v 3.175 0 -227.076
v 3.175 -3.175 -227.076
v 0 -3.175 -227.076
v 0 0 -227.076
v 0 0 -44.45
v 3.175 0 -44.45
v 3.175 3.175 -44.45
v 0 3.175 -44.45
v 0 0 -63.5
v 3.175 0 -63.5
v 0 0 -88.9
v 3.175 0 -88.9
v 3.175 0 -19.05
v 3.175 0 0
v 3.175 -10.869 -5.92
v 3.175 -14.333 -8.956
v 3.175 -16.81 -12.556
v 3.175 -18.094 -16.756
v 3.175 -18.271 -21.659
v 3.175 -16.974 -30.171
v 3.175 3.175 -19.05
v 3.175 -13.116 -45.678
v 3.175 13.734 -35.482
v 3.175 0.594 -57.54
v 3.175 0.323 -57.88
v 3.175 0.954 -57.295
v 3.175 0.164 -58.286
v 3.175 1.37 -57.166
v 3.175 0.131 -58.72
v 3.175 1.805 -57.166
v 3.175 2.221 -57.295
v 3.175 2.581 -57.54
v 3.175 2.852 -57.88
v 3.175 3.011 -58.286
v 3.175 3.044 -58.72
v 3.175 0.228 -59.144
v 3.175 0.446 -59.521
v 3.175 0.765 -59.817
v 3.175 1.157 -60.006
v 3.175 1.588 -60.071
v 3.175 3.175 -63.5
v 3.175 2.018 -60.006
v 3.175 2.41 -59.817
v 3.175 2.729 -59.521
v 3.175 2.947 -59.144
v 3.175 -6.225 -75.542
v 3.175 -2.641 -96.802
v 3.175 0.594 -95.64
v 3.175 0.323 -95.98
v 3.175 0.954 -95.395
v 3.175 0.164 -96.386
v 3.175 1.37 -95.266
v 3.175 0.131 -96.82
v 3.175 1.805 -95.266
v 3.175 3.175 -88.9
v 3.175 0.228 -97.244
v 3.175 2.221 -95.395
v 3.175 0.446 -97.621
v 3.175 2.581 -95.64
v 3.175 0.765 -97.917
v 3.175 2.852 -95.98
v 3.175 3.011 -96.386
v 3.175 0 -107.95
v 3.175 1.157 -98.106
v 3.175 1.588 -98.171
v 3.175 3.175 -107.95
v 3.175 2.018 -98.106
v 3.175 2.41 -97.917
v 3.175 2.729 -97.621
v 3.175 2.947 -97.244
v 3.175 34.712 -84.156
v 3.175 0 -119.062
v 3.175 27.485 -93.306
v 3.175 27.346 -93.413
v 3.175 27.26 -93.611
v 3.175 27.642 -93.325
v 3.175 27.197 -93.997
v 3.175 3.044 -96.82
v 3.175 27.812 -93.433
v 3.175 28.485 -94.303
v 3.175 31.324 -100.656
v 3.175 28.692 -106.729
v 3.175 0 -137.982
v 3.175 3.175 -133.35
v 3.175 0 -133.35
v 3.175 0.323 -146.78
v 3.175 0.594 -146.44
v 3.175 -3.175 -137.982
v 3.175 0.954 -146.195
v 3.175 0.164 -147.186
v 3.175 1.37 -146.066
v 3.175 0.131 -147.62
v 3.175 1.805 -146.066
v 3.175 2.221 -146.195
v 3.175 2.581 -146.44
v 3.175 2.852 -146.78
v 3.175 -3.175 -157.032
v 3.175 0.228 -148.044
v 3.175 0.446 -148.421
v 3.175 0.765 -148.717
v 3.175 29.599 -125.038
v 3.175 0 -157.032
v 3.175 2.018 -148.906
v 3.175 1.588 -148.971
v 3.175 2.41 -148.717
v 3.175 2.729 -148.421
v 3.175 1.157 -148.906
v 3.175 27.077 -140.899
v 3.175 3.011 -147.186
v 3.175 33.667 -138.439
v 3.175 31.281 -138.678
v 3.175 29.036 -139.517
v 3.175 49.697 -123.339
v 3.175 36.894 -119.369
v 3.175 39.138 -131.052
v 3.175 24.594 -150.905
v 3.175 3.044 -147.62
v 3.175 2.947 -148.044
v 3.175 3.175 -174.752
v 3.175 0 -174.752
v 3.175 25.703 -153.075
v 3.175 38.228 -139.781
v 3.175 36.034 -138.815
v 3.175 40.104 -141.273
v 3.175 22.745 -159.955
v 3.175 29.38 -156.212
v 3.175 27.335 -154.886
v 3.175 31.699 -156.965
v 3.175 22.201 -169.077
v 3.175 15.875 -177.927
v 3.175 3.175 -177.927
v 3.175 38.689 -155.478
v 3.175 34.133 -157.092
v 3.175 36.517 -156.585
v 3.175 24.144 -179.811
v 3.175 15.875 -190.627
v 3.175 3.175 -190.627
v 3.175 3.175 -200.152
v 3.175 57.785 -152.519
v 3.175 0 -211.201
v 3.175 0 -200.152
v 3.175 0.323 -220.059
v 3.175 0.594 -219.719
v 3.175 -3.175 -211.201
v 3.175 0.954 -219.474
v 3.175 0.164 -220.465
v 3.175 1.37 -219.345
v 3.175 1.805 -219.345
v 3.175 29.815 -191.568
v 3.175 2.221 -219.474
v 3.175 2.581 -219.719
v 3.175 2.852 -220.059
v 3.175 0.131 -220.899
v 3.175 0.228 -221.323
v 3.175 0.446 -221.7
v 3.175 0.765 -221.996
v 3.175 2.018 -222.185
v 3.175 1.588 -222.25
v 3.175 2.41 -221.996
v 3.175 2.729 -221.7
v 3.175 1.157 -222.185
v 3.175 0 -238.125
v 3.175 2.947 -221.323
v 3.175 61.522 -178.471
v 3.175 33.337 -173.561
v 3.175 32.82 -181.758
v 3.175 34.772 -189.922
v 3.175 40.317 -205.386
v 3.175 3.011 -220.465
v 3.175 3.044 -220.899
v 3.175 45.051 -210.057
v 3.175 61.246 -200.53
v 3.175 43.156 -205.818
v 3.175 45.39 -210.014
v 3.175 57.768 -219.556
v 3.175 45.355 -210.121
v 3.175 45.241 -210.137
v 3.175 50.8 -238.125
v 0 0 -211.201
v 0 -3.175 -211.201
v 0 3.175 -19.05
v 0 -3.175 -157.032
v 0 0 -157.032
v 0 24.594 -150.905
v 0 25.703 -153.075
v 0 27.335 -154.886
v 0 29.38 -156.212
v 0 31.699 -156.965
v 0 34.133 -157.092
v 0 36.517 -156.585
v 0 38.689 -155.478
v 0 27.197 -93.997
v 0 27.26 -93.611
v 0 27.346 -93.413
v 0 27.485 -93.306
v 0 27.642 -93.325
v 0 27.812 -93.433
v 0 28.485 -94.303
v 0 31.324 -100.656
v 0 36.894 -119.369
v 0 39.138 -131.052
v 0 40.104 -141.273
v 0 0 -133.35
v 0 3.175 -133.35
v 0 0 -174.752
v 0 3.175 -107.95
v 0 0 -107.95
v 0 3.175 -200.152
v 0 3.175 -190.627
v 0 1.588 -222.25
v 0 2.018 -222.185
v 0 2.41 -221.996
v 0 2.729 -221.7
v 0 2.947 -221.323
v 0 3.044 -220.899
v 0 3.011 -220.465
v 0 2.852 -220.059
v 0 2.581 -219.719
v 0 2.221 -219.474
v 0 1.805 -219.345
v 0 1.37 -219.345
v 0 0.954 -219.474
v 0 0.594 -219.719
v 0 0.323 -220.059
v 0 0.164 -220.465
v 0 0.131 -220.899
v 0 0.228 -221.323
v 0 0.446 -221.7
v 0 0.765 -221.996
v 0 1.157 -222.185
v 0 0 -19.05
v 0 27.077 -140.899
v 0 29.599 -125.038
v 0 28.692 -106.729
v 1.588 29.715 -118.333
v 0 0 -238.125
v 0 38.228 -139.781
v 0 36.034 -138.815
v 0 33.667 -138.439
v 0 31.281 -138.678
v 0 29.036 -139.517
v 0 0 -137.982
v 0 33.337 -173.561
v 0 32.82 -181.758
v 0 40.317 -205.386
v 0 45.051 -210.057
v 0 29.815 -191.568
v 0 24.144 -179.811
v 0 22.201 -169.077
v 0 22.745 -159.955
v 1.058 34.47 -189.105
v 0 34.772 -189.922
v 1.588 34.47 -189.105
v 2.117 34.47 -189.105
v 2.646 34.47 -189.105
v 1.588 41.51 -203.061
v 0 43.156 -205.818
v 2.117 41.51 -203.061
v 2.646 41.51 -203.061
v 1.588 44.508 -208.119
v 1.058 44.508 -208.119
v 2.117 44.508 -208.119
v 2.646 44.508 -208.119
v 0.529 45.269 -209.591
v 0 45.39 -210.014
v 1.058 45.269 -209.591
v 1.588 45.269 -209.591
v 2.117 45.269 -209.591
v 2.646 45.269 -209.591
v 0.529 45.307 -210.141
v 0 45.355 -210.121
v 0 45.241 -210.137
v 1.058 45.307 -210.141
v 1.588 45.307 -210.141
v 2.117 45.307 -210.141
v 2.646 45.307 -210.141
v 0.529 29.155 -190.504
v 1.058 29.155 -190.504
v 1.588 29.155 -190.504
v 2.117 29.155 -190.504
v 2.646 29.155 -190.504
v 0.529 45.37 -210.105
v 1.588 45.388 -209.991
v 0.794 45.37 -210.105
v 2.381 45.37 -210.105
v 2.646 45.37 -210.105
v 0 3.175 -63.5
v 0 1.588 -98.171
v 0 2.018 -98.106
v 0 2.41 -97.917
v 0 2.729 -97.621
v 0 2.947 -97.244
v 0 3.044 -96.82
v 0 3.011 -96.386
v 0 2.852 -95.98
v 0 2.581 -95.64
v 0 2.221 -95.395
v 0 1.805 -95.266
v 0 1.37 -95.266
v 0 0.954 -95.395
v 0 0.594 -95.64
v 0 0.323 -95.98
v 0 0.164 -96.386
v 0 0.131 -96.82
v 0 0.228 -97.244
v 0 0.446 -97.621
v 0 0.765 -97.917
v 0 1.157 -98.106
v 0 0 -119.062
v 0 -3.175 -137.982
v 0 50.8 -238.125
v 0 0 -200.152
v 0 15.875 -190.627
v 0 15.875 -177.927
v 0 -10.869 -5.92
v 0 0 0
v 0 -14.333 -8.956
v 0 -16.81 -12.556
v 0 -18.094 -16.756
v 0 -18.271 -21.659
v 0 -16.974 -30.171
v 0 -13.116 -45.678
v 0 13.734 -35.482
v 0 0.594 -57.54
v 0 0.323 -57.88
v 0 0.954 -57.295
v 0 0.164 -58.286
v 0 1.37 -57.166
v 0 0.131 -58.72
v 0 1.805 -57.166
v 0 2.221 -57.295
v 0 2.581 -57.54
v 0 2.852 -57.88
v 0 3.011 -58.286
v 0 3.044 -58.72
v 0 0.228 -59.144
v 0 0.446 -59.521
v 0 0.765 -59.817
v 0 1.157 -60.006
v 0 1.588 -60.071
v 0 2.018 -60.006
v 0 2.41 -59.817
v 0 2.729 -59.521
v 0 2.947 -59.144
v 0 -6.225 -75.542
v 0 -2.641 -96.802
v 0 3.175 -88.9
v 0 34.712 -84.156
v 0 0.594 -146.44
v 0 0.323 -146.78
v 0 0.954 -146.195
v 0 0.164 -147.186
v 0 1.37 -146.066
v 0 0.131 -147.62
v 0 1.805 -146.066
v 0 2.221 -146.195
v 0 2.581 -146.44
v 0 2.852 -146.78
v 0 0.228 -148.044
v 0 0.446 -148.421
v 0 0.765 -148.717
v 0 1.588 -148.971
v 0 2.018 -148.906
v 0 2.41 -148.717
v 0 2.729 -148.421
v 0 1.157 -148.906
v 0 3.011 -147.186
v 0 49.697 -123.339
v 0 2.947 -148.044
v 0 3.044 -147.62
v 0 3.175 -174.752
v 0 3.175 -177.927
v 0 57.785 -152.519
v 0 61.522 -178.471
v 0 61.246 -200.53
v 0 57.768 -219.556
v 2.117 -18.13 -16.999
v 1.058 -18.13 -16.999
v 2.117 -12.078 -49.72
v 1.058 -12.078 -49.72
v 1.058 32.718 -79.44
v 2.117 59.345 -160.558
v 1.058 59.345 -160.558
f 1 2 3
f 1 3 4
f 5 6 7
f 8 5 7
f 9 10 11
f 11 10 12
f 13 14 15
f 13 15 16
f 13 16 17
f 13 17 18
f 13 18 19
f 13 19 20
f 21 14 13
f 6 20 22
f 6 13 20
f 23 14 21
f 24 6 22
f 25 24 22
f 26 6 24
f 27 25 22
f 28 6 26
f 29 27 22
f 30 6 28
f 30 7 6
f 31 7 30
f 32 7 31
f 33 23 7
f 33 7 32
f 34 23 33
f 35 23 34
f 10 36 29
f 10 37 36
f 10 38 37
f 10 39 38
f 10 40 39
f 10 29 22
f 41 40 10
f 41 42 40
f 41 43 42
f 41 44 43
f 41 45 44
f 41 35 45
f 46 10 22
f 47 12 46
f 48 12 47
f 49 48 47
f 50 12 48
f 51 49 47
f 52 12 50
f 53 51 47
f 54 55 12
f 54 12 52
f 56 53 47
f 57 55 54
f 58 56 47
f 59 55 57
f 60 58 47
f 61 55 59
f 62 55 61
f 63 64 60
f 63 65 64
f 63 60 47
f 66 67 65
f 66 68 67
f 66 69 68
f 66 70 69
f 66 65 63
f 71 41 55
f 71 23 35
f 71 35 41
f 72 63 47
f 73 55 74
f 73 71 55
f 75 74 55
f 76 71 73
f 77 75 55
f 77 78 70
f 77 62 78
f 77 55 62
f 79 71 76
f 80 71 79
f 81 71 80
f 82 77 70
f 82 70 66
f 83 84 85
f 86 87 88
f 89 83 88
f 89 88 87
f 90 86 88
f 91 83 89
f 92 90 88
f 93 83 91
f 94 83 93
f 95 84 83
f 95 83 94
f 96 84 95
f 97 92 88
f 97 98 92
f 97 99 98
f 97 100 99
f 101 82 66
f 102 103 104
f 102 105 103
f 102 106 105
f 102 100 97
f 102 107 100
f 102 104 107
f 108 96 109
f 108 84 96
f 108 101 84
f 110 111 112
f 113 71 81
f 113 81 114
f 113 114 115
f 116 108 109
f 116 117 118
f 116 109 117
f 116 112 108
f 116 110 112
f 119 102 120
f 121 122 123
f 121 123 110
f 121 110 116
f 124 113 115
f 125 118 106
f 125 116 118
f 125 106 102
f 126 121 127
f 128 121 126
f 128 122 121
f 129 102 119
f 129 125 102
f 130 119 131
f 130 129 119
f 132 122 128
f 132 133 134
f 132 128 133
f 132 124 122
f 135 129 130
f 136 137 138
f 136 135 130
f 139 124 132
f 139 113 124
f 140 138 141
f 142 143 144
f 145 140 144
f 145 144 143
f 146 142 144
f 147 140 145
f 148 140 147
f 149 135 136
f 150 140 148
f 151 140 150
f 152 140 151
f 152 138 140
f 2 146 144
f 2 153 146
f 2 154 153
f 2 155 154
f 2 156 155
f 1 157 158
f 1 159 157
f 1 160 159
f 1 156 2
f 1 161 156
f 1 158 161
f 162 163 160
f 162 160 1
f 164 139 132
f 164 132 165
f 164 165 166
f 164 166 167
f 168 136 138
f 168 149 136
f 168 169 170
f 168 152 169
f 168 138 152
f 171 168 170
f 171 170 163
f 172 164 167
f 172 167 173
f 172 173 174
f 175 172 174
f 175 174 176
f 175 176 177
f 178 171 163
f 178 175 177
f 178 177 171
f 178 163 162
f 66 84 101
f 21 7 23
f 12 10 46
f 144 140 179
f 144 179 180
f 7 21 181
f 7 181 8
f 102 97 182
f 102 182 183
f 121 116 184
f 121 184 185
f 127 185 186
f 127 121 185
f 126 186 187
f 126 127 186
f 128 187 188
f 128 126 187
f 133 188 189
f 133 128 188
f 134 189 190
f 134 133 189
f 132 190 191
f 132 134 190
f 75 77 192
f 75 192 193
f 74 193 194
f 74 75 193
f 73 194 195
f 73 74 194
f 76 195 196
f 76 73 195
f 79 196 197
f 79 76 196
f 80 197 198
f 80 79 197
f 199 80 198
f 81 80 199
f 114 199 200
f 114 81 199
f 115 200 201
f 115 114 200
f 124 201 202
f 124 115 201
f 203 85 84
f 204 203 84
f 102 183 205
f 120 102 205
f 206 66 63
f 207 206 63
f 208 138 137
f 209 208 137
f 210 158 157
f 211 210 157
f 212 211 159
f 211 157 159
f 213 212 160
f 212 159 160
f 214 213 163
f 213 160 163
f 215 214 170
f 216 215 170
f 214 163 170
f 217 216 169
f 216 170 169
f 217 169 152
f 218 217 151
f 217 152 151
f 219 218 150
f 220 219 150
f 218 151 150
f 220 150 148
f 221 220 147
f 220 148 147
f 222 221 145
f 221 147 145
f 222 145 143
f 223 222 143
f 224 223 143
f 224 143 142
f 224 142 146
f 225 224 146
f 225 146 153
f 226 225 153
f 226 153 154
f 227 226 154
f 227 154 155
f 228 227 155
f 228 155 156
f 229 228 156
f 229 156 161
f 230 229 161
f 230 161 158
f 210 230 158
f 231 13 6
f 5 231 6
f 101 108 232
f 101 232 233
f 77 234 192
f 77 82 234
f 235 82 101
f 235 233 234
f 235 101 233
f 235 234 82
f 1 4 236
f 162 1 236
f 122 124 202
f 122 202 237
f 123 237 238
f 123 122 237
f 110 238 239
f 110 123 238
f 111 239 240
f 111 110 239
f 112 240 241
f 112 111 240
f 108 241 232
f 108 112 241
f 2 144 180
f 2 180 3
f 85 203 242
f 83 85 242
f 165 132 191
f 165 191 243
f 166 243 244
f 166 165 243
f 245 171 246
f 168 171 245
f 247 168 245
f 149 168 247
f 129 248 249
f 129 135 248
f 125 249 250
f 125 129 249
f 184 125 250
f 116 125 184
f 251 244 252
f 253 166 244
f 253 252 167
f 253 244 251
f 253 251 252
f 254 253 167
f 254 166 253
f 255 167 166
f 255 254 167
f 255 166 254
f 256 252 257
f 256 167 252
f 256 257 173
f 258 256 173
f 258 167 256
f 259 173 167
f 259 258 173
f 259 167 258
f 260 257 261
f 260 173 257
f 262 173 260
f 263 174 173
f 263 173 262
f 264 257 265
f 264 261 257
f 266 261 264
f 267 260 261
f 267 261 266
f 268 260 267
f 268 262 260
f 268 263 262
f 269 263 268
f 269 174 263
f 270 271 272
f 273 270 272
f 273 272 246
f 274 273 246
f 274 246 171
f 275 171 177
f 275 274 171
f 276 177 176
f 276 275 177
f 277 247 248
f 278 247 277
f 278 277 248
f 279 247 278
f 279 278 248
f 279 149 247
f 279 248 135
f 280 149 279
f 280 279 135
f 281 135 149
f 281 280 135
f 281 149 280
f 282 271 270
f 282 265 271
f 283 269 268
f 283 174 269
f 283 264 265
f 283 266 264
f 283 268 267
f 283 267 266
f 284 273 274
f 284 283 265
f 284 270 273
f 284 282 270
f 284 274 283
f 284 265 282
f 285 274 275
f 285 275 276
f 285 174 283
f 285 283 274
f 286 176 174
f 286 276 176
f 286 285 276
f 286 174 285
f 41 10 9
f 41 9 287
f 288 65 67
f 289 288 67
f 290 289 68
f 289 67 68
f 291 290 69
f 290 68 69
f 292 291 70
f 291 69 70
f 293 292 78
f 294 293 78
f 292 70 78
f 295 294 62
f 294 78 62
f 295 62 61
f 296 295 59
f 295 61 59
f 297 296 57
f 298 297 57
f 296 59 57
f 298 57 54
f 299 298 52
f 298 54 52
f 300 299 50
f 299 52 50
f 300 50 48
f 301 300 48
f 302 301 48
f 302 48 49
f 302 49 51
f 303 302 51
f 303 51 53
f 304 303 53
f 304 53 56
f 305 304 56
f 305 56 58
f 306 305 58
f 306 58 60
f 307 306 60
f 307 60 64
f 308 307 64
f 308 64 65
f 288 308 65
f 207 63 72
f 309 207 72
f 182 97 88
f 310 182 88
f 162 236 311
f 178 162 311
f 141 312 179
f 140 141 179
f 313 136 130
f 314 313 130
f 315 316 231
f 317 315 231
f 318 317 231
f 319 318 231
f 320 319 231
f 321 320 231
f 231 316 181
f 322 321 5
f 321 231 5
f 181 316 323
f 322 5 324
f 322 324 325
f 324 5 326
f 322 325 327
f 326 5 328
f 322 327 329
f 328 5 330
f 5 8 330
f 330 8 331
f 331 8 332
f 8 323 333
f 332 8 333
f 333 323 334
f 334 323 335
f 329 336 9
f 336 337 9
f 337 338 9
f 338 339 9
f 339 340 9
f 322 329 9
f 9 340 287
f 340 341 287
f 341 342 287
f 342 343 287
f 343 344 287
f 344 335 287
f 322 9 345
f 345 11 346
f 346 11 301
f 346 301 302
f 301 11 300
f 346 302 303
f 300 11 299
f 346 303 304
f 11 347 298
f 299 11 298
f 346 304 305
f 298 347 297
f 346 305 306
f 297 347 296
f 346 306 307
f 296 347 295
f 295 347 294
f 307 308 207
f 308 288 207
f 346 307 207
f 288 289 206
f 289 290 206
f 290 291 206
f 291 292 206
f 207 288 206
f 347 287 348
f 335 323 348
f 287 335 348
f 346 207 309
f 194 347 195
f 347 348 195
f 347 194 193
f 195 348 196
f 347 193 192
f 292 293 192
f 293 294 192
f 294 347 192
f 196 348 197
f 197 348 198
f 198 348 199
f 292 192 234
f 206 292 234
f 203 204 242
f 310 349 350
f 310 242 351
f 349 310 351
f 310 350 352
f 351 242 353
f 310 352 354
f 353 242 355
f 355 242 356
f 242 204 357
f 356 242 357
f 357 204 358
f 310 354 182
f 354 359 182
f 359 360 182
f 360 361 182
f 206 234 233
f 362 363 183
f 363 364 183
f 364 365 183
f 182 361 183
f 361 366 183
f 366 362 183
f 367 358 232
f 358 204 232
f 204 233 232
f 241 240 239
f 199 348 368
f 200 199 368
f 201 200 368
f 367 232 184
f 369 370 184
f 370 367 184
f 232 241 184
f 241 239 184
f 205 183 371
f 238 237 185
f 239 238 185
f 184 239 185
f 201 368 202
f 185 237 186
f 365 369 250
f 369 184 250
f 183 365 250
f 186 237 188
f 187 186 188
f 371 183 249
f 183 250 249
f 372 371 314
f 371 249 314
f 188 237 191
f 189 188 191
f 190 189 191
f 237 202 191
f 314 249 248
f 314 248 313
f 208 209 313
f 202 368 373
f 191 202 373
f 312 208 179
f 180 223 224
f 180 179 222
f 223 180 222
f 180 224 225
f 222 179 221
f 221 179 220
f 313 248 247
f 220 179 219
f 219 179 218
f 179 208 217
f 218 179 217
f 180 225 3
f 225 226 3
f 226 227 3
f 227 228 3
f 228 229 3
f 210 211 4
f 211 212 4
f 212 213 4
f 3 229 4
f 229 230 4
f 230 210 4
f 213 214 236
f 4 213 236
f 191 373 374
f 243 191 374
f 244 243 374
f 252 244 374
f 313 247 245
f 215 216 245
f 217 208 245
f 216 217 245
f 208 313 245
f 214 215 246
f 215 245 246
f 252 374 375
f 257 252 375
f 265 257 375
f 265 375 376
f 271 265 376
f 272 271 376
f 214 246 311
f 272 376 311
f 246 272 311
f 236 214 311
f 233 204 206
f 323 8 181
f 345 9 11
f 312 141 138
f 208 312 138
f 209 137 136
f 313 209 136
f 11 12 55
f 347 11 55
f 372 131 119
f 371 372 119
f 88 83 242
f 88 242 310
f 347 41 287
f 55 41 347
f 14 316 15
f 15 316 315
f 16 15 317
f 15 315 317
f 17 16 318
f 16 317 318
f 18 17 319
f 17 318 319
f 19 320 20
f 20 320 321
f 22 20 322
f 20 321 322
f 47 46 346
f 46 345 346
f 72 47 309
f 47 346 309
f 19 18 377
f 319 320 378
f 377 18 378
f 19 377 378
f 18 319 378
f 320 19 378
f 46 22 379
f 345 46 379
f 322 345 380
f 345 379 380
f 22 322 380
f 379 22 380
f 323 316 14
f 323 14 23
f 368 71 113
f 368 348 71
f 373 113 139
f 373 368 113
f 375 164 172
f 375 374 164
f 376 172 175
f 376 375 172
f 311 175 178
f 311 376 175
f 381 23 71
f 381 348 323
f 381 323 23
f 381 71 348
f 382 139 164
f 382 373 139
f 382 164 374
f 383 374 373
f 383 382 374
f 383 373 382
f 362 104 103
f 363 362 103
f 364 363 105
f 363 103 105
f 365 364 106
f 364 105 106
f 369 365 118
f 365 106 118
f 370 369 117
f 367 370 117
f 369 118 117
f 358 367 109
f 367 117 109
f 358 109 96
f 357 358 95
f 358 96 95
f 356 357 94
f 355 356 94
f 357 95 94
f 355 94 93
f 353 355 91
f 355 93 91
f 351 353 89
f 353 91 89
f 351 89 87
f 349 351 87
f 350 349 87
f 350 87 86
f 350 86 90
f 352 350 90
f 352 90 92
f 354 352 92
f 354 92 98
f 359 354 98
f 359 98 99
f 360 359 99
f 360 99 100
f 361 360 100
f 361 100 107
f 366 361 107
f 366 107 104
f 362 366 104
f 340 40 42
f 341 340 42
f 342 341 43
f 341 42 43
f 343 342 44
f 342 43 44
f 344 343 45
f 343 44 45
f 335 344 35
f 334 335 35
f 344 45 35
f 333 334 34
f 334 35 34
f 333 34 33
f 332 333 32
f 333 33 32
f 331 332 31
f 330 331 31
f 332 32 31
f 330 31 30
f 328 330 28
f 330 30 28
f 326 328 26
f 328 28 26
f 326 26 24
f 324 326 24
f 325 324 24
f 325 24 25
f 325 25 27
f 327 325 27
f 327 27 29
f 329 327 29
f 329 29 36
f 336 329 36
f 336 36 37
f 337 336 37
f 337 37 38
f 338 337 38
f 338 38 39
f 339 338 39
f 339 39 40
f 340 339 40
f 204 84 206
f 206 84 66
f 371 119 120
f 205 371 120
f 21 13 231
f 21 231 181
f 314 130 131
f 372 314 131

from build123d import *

# Parameters (mm, degrees)
BOSS_EXTRUDE1_DEPTH = 3.175
SKETCH2_R           = 1.4605
SKETCH2_W           = 25.4
SKETCH2_H           = 3.175
CUT_EXTRUDE1_DEPTH  = 6.35
BOSS_EXTRUDE3_DEPTH = 3.175
CUT_EXTRUDE2_DEPTH  = 3.175
SKETCH5_R           = 9.342587617
BOSS_EXTRUDE4_DEPTH = 3.175


with BuildPart() as part:
    # Sketch1 → Boss-Extrude1 (new body)
    with BuildSketch(Plane(origin=(0, 0, 0), x_dir=(0, 0, -1), z_dir=(1, 0, 0))):
        with BuildLine():
            Line((119.0625, 0), (238.125, 0))
            Line((238.125, 0), (238.125, 50.8))
            add(Edge.make_bspline(
                [(0, 0), (76.859833449, 26.070949446), (164.07477212, 86.623684005), (238.125, 50.8)],
                knots=[0, 0, 0, 0, 1, 1, 1, 1], degree=3))
            add(Edge.make_bspline(
                [(0, 0), (16.104921012, -36.272981342), (24.443498776, -9.039116005), (119.0625, 0)],
                knots=[0, 0, 0, 0, 1, 1, 1, 1], degree=3))
        make_face()
    extrude(amount=BOSS_EXTRUDE1_DEPTH)

    # Sketch2 → Cut-Extrude1 (cut)
    with BuildSketch(Plane(origin=(3.175, 0, 0), x_dir=(0, 0, -1), z_dir=(1, 0, 0))):
        Polygon((177.927, 15.875), (177.927, 3.175), (183.007, 3.175), (190.627, 3.175), (190.627, 15.875), (183.007, 15.875), align=None)
        Polygon((174.752, 3.175), (174.752, 0), (200.152, 0), (200.152, 3.175), (195.707, 3.175), (190.627, 3.175), (183.007, 3.175), (177.927, 3.175), align=None)
        with Locations((220.7895, 1.5875)):
            Circle(SKETCH2_R)
        Polygon((107.95, 3.175), (107.95, 0), (119.0625, 0), (133.35, 0), (133.35, 3.175), align=None)
        with Locations((76.2, 1.5875)):
            Rectangle(SKETCH2_W, SKETCH2_H)
        with Locations((31.75, 1.5875)):
            Rectangle(SKETCH2_W, SKETCH2_H)
        with Locations((58.6105, 1.5875)):
            Circle(SKETCH2_R)
        with Locations((147.5105, 1.5875)):
            Circle(SKETCH2_R)
        with Locations((96.7105, 1.5875)):
            Circle(SKETCH2_R)
    extrude(amount=-CUT_EXTRUDE1_DEPTH, mode=Mode.SUBTRACT)

    # Sketch3 → Boss-Extrude3 (add)
    with BuildSketch(Plane(origin=(3.175, 0, 0), x_dir=(0, 0, -1), z_dir=(1, 0, 0))):
        Polygon((137.98202267, -3.175), (137.98202267, 0), (137.98202267, 0.026209123), (157.03202267, 0.026209123), (157.03202267, 0), (157.03202267, -3.175), align=None)
        Polygon((211.201, -3.175), (227.076, -3.175), (227.076, 0), (227.076, 0.026209123), (208.026, 0.026209123), (211.201, 0), align=None)
    extrude(amount=-BOSS_EXTRUDE3_DEPTH)

    # Sketch4 → Cut-Extrude2 (cut)
    with BuildSketch(Plane(origin=(3.175, 0, 0), x_dir=(0, 0, -1), z_dir=(1, 0, 0))):
        with BuildLine():
            add(Edge.make_bspline(
                [(93.99664506, 27.196963526), (87.827491263, 27.713590543), (153.186488297, 52.129457971), (177.611392836, 22.94058013), (221.234059198, 54.380853992), (168.907937304, 6.387246602), (142.457192969, 36.658963722), (96.798574364, 26.962319938), (93.99664506, 27.196963526)],
                knots=[0, 0, 0, 0, 0.221914177, 0.399724301, 0.497137411, 0.601893931, 0.899210191, 1, 1, 1, 1], degree=3))
        make_face()
    extrude(amount=-CUT_EXTRUDE2_DEPTH, mode=Mode.SUBTRACT)

    # Sketch5 → Boss-Extrude4 (add)
    with BuildSketch(Plane(origin=(3.175, 0, 0), x_dir=(0, 0, -1), z_dir=(1, 0, 0))):
        with Locations((147.778068115, 33.398328751)):
            Circle(SKETCH5_R)
    extrude(amount=-BOSS_EXTRUDE4_DEPTH)


solid = part.part
